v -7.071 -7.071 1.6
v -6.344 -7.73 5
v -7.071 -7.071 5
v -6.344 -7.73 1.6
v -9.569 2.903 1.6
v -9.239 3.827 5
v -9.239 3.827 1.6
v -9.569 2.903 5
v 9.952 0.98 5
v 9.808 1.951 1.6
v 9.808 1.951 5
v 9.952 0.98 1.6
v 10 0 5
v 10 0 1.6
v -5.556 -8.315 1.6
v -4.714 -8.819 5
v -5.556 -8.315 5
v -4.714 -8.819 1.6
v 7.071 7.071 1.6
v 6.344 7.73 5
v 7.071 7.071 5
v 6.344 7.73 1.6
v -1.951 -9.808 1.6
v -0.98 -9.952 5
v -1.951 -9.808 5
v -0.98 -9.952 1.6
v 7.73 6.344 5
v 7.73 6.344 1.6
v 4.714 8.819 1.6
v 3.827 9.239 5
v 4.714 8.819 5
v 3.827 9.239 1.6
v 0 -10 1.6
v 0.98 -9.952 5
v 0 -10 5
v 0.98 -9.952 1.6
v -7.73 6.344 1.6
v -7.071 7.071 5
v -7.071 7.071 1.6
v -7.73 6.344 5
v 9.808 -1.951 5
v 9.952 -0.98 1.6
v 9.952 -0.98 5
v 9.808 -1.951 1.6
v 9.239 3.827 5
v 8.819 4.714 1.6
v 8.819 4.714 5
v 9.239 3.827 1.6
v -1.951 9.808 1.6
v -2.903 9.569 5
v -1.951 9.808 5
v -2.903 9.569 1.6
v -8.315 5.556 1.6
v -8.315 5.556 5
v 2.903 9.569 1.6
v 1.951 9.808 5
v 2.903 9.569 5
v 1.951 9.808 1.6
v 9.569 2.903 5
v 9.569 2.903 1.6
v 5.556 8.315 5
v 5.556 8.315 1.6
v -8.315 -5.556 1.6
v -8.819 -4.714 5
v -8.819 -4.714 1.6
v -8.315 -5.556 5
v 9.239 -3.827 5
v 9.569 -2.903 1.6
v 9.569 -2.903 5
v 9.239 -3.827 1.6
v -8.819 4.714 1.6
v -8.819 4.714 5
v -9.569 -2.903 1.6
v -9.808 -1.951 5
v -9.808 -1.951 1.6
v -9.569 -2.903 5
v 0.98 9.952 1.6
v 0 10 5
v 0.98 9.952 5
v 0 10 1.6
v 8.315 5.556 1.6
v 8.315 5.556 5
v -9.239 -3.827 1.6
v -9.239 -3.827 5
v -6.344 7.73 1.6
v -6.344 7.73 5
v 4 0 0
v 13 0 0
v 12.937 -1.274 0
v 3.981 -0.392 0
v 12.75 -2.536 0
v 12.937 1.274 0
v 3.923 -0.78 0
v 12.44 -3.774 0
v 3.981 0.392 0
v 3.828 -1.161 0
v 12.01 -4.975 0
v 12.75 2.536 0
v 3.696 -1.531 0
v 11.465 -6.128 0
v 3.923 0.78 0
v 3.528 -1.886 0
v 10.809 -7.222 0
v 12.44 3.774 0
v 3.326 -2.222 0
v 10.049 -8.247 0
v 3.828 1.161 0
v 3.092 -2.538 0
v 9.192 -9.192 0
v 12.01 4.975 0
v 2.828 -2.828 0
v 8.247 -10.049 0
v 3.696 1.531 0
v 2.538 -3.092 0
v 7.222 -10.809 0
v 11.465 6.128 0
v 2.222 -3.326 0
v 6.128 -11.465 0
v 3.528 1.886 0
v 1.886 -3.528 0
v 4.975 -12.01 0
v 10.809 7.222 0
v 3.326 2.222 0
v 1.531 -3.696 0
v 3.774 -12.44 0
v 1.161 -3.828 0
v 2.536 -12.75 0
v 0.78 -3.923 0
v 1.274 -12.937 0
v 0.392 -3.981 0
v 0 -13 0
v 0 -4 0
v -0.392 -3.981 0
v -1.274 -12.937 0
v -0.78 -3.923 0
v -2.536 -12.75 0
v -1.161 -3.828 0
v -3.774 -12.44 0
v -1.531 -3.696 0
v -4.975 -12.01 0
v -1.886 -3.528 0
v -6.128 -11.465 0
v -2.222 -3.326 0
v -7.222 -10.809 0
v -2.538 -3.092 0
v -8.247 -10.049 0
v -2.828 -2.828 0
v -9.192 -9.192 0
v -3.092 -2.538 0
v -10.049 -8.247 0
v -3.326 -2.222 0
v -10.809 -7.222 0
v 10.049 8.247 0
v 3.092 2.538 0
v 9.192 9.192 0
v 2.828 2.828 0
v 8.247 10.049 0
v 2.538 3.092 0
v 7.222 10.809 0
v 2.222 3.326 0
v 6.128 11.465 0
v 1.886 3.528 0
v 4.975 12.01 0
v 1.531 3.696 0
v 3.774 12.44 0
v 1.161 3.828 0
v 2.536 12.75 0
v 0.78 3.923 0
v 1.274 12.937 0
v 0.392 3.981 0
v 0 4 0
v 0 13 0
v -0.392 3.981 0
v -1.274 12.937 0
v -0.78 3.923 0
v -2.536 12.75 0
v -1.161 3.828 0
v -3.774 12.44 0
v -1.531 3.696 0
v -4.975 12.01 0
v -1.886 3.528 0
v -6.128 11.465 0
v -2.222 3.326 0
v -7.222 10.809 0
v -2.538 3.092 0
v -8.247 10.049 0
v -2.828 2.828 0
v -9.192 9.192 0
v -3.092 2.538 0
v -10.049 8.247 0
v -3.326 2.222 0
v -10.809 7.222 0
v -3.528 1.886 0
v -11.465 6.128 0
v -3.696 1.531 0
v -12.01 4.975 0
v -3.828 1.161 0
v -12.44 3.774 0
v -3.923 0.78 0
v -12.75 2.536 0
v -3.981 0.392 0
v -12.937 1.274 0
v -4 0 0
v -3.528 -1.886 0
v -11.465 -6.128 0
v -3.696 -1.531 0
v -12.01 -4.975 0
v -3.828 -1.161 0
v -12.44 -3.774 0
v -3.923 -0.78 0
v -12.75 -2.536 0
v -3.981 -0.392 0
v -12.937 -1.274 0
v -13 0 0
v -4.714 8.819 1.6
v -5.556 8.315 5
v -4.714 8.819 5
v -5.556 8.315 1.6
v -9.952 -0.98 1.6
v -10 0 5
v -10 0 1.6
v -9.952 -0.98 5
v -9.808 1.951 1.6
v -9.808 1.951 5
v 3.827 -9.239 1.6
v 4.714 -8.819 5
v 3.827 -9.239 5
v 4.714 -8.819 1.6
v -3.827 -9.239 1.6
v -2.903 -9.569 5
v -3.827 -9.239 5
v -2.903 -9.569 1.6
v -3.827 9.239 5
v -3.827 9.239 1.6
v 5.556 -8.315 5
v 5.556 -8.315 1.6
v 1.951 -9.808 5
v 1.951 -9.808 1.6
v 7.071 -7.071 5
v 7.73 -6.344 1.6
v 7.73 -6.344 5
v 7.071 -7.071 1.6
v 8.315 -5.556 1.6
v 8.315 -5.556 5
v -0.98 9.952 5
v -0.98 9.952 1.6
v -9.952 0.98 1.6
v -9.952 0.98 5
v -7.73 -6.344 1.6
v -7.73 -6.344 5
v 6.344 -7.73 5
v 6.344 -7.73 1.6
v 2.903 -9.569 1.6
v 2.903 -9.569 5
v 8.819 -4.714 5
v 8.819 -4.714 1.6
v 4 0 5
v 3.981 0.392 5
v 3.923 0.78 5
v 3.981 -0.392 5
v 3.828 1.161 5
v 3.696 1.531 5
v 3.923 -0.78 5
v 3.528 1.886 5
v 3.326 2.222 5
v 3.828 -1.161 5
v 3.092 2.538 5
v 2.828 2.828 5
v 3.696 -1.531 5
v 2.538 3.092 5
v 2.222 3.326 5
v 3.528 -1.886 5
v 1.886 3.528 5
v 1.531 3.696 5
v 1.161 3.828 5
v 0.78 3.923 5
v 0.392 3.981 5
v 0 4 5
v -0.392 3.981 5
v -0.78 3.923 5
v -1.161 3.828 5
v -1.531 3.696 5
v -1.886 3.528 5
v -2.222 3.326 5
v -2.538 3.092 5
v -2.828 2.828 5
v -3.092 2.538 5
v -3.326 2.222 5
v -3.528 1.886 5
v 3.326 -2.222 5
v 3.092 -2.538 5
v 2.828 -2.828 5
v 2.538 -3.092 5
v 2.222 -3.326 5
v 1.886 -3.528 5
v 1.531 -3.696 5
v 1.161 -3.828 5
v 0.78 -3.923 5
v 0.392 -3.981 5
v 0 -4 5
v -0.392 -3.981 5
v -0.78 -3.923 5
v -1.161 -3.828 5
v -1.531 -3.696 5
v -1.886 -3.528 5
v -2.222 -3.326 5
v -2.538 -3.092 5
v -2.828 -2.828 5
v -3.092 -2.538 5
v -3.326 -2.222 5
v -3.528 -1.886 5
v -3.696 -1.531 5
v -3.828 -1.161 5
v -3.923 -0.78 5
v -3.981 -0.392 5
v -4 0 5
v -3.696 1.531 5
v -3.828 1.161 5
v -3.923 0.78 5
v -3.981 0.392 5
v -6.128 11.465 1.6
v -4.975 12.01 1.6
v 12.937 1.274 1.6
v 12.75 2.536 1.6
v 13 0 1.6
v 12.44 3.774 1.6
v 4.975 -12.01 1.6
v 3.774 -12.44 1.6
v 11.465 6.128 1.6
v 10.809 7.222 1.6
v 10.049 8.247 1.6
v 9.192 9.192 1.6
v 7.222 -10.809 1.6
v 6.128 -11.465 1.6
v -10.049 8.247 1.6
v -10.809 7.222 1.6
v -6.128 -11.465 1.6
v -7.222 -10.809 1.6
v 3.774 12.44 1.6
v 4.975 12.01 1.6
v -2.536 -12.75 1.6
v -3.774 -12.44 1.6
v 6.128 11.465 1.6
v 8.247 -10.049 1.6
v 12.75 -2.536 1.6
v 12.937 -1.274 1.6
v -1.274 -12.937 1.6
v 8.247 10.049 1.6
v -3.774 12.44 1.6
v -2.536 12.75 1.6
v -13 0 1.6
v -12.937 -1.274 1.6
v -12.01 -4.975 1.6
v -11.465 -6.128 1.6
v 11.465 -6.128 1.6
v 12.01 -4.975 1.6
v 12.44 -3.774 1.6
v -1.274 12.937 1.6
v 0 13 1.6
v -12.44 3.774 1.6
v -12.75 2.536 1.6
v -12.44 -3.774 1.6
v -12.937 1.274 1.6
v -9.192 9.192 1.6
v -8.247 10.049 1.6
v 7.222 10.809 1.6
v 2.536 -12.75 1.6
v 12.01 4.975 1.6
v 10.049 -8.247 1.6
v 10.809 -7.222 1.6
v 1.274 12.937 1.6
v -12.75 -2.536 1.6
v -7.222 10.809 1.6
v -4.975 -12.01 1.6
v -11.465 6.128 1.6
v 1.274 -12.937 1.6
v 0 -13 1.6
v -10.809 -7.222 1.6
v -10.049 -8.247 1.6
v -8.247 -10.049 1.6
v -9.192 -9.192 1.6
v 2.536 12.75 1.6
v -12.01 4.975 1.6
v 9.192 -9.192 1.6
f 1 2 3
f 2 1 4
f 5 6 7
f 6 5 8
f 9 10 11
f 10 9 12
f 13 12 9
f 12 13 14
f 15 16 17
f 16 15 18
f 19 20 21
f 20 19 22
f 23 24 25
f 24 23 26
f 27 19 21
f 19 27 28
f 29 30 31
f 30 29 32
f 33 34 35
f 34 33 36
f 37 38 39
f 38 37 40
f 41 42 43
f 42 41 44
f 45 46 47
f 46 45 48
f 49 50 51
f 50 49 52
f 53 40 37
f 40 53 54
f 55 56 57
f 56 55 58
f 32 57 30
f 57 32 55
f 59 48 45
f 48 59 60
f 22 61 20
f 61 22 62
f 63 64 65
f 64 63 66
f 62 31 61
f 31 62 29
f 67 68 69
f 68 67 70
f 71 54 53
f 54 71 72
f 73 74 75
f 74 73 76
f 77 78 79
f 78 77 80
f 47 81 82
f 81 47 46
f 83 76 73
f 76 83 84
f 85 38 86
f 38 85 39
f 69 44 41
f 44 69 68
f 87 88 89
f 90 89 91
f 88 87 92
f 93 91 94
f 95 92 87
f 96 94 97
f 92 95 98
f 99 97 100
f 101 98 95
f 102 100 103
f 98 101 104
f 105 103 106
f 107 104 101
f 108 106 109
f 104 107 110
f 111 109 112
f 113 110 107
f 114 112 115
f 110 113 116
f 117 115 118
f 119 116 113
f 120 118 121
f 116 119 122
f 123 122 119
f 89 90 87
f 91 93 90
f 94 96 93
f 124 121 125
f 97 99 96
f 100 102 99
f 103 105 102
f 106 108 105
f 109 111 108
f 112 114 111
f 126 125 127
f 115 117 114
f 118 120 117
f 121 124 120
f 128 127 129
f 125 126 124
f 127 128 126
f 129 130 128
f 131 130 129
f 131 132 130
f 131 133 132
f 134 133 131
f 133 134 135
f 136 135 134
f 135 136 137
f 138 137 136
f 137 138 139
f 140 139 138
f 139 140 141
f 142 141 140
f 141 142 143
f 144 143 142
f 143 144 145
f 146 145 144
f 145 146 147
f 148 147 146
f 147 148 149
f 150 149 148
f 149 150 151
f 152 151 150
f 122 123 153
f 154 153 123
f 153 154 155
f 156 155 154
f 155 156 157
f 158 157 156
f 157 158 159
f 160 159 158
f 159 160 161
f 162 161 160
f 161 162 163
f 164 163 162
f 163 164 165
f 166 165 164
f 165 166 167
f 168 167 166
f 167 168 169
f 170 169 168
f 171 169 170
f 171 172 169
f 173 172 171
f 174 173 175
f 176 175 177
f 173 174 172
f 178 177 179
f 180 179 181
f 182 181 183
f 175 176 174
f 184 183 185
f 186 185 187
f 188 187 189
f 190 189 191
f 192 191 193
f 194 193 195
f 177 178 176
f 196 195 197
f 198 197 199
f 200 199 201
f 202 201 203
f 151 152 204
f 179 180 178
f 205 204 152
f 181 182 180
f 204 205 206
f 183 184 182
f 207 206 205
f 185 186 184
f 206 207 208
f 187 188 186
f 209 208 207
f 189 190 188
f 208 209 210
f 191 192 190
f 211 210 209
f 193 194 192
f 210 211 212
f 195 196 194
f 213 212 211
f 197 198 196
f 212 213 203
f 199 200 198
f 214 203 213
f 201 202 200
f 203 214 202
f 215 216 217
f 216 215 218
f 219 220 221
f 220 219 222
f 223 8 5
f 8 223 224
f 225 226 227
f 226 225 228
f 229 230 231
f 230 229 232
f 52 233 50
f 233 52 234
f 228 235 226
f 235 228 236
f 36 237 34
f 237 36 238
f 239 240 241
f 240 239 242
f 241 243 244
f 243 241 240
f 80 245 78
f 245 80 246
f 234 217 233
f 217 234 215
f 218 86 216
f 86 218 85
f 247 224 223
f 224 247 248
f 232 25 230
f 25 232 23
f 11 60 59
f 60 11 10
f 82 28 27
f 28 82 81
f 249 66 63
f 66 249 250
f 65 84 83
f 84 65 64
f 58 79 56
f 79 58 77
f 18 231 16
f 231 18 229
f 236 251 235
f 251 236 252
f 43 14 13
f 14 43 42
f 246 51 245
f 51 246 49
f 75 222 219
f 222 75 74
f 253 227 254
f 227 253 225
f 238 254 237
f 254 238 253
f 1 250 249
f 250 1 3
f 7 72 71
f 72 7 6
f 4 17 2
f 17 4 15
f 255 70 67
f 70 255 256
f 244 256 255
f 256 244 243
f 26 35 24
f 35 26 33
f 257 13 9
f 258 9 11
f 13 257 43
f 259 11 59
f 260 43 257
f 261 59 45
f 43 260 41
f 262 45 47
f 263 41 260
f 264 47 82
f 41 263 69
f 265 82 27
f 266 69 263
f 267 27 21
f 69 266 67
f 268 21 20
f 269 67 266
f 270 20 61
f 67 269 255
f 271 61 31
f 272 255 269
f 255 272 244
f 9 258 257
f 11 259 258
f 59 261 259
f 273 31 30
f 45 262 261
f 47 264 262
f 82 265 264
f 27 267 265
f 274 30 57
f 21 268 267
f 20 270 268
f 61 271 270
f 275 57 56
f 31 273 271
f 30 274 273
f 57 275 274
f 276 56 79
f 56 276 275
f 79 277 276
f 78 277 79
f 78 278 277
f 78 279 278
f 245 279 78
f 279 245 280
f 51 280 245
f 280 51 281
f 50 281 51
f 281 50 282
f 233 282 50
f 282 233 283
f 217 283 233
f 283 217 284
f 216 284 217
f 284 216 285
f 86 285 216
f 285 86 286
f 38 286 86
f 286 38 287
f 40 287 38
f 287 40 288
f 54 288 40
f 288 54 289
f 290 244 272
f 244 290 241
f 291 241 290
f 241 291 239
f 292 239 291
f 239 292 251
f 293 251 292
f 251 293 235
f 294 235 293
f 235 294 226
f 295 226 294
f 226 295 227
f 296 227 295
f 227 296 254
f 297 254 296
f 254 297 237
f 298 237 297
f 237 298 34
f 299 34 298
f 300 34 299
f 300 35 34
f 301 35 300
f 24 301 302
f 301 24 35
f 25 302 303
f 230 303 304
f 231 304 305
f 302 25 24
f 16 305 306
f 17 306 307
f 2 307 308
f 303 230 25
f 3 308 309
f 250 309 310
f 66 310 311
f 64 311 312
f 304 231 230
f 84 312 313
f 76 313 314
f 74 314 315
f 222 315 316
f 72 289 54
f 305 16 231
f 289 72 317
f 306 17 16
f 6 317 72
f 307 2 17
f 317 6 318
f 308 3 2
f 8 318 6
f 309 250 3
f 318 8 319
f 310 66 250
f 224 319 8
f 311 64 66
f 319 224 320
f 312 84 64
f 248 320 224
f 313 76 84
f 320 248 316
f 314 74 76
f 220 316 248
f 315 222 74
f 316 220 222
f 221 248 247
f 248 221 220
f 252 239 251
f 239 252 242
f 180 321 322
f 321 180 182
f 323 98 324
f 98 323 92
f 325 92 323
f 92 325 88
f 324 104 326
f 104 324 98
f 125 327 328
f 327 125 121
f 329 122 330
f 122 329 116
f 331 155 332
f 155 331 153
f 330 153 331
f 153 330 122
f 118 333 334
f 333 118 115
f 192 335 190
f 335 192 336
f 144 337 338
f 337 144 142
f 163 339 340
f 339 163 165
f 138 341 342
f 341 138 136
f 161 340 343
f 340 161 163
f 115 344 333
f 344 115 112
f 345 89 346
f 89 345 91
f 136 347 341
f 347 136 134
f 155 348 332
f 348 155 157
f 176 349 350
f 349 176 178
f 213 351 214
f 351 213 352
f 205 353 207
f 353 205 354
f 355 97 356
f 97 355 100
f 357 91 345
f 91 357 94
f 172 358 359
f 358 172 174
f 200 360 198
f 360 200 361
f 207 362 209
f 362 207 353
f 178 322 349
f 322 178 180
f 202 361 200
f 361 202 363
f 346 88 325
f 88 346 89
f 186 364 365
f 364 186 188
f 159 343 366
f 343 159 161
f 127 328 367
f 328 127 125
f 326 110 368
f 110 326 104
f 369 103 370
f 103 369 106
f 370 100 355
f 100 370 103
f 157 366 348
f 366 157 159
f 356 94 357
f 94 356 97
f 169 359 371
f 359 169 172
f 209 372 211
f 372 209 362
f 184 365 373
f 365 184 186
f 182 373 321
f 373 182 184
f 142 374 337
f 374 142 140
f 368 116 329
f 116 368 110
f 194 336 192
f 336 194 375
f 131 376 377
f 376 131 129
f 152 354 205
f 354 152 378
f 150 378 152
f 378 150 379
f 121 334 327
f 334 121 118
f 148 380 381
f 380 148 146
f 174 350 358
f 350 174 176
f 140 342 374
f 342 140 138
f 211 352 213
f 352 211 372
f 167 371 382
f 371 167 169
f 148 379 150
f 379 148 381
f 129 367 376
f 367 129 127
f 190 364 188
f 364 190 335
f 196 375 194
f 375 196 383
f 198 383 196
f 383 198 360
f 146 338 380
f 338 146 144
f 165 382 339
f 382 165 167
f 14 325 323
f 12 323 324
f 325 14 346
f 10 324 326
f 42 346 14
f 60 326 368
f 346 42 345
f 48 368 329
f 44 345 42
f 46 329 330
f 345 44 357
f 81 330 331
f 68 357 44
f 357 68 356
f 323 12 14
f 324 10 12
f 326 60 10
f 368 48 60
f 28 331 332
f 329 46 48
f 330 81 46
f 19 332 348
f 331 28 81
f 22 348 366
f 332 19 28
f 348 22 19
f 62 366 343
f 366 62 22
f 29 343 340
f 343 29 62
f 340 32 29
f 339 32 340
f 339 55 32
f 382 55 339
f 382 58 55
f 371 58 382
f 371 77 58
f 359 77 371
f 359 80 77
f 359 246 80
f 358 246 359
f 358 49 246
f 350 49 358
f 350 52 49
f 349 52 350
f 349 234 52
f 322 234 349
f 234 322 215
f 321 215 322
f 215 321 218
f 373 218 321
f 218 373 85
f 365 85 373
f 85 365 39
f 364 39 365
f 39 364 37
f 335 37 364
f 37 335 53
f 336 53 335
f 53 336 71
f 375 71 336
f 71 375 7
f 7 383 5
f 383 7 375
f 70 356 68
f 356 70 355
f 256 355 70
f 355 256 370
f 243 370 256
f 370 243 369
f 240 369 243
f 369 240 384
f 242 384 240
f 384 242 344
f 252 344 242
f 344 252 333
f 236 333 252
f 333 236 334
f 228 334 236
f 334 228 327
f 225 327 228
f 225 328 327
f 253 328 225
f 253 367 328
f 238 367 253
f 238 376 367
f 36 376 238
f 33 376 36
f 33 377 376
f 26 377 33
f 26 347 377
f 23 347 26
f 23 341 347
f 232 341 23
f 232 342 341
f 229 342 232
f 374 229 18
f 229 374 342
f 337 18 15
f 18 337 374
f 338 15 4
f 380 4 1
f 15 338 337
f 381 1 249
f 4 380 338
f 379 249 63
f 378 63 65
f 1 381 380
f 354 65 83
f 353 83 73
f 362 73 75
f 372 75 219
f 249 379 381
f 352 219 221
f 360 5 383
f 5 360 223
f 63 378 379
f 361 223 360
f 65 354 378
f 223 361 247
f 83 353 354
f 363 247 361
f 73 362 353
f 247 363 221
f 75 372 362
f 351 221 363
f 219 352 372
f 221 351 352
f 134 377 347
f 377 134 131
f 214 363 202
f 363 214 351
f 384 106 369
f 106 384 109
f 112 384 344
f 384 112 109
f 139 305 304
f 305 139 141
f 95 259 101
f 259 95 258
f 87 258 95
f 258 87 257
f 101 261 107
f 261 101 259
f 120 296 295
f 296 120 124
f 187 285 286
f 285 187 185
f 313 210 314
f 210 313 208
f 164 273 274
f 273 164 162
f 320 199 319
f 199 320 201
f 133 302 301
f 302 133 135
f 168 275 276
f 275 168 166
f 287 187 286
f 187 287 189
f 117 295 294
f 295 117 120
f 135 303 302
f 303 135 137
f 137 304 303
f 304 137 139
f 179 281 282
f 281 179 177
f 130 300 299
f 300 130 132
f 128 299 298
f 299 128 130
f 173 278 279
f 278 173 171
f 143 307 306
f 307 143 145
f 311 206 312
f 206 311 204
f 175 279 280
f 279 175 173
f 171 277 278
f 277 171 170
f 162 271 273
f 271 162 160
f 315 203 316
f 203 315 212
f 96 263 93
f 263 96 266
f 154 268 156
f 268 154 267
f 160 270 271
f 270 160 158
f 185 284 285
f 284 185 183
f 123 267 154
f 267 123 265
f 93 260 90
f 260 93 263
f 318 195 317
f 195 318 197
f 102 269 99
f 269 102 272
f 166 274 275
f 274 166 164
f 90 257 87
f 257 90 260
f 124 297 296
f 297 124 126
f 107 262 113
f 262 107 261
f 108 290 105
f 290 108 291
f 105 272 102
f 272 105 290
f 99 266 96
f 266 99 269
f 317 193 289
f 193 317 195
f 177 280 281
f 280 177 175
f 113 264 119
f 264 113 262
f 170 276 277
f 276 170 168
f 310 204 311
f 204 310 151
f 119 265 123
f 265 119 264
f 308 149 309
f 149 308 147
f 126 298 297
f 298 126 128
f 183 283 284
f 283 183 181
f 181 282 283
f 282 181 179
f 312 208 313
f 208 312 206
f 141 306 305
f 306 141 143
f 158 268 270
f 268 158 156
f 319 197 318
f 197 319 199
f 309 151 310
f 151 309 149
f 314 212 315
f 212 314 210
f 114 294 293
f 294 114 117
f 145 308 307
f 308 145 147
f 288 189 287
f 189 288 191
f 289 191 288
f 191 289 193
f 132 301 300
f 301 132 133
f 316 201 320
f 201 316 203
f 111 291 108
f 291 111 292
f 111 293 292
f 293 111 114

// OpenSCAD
// example-spacer.scad
//
// Template part. Shows the house style: parameters at the top, geometry in a
// module, one call at the bottom. Copy this when starting a new part.

/* [Dimensions] */
outer_d   = 20;   // outer diameter (mm)
inner_d   = 8;    // bore diameter (mm)
height    = 5;    // overall height (mm)
flange_d  = 26;   // flange diameter (mm)
flange_h  = 1.6;  // flange thickness (mm)

/* [Quality] */
$fn = 64;         // segments per full circle

// Small overshoot used on every subtracted solid so its faces are never
// coplanar with the parent's. Coplanar faces produce zero-thickness walls that
// confuse the renderer and the slicer.
eps = 0.01;

module spacer() {
    difference() {
        union() {
            cylinder(d = outer_d, h = height);
            cylinder(d = flange_d, h = flange_h);
        }

        // bore, punched all the way through and out both ends
        translate([0, 0, -eps])
            cylinder(d = inner_d, h = height + 2 * eps);
    }
}

spacer();
